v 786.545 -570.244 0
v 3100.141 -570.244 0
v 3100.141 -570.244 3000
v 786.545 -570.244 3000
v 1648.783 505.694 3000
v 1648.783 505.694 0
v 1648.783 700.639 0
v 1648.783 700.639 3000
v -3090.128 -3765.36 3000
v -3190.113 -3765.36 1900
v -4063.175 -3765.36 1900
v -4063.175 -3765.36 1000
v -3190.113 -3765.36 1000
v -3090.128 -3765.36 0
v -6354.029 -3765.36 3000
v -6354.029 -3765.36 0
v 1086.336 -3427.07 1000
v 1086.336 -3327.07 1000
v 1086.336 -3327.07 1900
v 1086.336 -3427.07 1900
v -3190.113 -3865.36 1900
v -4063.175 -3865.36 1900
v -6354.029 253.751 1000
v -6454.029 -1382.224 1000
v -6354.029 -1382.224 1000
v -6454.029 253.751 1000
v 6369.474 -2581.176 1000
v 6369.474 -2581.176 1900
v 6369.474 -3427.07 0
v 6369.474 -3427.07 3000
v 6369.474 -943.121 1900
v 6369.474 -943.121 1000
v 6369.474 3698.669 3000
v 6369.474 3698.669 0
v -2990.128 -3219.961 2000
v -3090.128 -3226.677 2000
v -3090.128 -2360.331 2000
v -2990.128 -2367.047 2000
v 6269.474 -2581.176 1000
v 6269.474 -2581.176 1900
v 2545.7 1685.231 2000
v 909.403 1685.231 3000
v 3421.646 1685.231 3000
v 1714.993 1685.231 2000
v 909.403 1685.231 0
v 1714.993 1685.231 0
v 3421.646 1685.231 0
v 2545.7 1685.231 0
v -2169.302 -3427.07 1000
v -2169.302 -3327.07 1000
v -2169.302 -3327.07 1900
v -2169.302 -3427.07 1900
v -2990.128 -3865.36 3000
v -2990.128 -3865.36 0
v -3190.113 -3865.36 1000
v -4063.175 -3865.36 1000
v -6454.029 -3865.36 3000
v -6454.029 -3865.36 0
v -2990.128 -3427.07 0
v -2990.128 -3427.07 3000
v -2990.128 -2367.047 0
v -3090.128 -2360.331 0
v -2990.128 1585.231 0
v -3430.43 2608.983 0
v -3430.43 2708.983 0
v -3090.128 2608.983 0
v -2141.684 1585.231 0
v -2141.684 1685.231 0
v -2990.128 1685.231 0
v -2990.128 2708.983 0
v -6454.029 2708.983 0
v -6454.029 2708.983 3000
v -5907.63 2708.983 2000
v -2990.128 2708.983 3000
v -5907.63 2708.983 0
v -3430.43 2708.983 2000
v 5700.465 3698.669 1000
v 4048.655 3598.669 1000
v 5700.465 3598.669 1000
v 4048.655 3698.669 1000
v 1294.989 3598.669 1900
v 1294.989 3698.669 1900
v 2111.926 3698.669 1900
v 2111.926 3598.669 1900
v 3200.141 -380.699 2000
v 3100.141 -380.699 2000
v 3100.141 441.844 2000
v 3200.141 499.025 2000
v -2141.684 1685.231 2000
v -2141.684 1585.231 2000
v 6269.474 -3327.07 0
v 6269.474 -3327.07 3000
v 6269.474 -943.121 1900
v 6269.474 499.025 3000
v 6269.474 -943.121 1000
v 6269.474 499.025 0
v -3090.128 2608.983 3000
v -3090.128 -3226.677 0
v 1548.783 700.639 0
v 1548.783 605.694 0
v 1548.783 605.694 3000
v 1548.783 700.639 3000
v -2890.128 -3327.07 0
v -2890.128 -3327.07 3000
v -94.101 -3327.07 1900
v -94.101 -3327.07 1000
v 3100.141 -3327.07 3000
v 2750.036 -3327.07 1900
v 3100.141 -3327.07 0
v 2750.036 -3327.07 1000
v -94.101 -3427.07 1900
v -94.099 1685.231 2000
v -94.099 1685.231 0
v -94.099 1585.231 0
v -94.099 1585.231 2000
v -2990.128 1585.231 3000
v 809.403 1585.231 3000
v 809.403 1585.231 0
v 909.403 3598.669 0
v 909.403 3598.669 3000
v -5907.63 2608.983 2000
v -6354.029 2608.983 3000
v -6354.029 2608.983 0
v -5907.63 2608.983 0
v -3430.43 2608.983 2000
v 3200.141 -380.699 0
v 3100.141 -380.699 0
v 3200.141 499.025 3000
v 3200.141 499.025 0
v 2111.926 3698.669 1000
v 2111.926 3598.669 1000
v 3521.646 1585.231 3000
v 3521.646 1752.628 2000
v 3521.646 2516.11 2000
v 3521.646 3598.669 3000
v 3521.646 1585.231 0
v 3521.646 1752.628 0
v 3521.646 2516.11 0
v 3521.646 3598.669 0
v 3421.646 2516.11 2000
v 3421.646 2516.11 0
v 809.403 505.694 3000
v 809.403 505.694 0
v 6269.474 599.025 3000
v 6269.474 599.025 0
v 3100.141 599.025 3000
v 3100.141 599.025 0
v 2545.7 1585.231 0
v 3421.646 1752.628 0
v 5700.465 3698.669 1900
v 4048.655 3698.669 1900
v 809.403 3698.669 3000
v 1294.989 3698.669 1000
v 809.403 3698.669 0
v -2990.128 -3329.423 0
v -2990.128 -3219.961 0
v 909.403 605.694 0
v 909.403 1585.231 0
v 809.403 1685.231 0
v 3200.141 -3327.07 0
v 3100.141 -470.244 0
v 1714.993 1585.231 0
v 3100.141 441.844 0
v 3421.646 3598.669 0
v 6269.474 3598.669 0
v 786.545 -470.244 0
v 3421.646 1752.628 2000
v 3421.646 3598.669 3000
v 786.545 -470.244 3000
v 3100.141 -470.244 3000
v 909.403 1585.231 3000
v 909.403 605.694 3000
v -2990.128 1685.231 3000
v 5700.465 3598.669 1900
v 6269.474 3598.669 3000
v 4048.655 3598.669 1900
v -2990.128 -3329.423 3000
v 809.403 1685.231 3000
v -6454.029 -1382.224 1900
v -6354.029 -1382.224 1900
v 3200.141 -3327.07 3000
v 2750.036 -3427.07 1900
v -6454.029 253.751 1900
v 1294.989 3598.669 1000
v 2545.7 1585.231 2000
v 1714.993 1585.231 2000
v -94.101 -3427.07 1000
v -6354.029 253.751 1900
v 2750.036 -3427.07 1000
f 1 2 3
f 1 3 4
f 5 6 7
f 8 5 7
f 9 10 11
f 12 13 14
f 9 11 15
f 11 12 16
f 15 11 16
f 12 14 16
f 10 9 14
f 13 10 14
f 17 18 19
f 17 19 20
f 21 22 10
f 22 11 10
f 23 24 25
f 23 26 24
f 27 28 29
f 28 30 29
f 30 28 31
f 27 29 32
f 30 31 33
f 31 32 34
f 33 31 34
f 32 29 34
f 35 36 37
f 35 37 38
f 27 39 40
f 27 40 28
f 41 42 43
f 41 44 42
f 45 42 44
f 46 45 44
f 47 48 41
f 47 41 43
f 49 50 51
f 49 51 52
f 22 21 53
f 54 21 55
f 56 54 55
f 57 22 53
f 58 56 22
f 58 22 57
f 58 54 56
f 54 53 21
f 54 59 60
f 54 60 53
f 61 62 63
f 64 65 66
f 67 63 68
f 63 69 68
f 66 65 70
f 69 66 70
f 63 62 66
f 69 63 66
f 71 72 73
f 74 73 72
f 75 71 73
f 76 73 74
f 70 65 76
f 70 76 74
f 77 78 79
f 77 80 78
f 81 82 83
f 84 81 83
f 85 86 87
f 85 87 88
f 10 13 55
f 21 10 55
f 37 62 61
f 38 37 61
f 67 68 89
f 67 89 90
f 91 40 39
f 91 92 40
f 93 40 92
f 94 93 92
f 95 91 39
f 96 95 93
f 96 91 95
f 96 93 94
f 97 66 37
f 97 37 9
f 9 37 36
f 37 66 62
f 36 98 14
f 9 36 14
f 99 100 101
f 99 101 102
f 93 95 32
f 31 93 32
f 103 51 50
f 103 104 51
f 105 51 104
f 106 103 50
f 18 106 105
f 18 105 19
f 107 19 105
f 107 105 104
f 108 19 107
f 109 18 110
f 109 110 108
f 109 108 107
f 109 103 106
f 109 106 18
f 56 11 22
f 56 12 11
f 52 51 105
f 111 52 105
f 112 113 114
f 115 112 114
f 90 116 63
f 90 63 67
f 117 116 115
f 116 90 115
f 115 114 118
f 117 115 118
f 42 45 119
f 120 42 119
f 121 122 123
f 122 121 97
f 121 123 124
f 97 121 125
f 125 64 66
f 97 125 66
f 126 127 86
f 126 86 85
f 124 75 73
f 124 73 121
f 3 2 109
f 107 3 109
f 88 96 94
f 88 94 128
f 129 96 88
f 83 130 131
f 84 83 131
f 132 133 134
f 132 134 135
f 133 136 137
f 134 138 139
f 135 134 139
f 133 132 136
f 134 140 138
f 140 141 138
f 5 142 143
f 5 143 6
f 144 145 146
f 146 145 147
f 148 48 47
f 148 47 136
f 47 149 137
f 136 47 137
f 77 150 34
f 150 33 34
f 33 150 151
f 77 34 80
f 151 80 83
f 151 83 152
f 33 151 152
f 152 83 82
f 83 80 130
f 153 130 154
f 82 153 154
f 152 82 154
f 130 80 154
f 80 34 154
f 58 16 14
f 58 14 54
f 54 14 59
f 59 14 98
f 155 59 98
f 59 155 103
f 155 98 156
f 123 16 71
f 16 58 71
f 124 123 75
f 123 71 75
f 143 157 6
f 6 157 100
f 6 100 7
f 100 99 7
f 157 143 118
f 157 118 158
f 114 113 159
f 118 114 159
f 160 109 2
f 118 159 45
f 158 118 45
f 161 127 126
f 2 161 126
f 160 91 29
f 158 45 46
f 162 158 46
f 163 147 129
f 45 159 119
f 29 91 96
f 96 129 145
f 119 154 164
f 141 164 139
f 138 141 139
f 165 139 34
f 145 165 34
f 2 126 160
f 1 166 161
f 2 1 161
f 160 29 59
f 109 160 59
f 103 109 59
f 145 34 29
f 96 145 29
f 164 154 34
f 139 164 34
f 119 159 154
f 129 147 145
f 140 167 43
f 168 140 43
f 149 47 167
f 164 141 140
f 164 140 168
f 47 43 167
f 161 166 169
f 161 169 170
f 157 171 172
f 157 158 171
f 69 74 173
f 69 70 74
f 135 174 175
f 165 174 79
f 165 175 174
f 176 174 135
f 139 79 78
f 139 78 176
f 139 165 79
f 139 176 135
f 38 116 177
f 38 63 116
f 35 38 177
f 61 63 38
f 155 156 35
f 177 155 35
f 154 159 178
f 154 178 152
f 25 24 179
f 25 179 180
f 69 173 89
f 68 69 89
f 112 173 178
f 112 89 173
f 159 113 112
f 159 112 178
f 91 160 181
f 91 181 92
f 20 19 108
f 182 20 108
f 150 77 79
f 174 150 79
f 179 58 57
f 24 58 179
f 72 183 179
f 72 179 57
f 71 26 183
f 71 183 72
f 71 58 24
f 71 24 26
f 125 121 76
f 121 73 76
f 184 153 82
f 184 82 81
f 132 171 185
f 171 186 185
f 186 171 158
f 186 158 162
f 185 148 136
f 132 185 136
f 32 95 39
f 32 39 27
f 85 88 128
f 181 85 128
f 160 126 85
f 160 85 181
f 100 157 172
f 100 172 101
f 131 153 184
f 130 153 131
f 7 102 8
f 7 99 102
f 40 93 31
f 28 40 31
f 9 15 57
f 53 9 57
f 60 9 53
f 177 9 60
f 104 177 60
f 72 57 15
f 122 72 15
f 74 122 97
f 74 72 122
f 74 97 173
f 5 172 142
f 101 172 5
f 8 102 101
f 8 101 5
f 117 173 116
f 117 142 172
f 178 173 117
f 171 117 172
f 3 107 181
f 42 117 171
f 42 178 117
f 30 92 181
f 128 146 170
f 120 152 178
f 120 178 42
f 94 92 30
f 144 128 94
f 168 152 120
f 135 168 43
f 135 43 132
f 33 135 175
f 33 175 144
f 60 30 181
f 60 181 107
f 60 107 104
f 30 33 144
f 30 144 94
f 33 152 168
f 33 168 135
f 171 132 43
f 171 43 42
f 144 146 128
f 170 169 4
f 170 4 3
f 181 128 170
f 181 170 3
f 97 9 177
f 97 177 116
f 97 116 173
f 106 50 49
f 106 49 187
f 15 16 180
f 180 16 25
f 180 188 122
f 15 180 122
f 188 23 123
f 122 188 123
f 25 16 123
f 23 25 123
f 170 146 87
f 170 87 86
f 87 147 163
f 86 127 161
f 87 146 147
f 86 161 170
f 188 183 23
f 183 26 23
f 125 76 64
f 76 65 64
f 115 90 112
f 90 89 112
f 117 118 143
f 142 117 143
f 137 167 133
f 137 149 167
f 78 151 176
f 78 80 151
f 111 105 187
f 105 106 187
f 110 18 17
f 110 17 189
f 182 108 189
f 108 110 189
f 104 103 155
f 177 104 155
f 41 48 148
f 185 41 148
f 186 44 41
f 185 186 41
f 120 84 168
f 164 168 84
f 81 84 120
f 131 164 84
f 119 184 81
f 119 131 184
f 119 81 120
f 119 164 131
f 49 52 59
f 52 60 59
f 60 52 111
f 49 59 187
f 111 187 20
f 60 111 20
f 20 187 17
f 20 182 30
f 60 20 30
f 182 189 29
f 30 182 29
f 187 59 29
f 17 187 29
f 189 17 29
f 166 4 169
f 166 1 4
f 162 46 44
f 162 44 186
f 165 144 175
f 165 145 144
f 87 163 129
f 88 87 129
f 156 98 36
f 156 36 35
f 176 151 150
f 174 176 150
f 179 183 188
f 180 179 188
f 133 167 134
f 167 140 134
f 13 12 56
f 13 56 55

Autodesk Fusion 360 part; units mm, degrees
sketch "Sketch1" plane through (0, 0, 0) normal (0, 0, 1) x (1, 0, 0)
  line L0 (-2990.1281, -3865.3597) -> (-6454.0292, -3865.3597)
  line L1 (-6454.0292, -3865.3597) -> (-6454.0292, 2708.9832)
  line L2 (-6454.0292, 2708.9832) -> (-2990.1281, 2708.9832)
  line L3 (-2990.1281, 2708.9832) -> (-2990.1281, -3865.3597)
  line L4 (-2990.1281, -3427.0701) -> (6369.4739, -3427.0701)
  line L5 (6369.4739, -3427.0701) -> (6369.4739, 3698.6692)
  line L6 (6369.4739, 3698.6692) -> (809.4029, 3698.6692)
  line L7 (-2990.1281, 2708.9832) -> (-2990.1281, -3427.0701)
  line L8 (-2990.1281, 1685.2306) -> (809.4029, 1685.2306)
  line L9 (809.4029, 1685.2306) -> (809.4029, 3698.6692)
  line L10 (-2990.1281, 2708.9832) -> (-2990.1281, 1685.2306)
  line L11 (6369.4739, 599.0251) -> (3100.141, 599.0251)
  line L12 (3100.141, 599.0251) -> (3100.141, -3427.0701)
  line L13 (3100.141, -3427.0701) -> (6369.4739, -3427.0701)
  line L14 (6369.4739, -3427.0701) -> (6369.4739, 599.0251)
  line L15 (3100.141, -570.2441) -> (786.5447, -570.2441)
  line L16 (786.5447, -570.2441) -> (786.5447, -470.2441)
  line L17 (786.5447, -470.2441) -> (3100.141, -470.2441)
  line L18 (3100.141, -470.2441) -> (3100.141, -570.2441)
  line L19 (-3090.1281, -3765.3597) -> (-6354.0292, -3765.3597)
  line L20 (-6354.0292, -3765.3597) -> (-6354.0292, 2608.9832)
  line L21 (-6354.0292, 2608.9832) -> (-3090.1281, 2608.9832)
  line L22 (-3090.1281, 2608.9832) -> (-3090.1281, -3765.3597)
  line L23 (-2890.1281, -3327.0701) -> (6269.4739, -3327.0701)
  line L24 (6269.4739, -3327.0701) -> (6269.4739, 3598.6692)
  line L25 (6269.4739, 3598.6692) -> (909.4029, 3598.6692)
  line L26 (909.4029, 1585.2306) -> (909.4029, 3598.6692)
  line L27 (-2890.1281, 1585.2306) -> (909.4029, 1585.2306)
  line L28 (-2890.1281, -3327.0701) -> (-2990.1281, -3329.4228)
  line L29 (-2890.1281, 1585.2306) -> (-2990.1281, 1585.2306)
  line L30 (6369.4739, 499.0251) -> (3200.141, 499.0251)
  line L31 (3200.141, 499.0251) -> (3200.141, -3427.0701)
  line L32 (809.4029, 1585.2306) -> (3521.6455, 1585.2306)
  line L33 (3521.6455, 1585.2306) -> (3521.6455, 3698.6692)
  line L34 (3521.6455, 3698.6692) -> (809.4029, 3698.6692)
  line L35 (809.4029, 3698.6692) -> (809.4029, 1585.2306)
  line L36 (809.4029, 1685.2306) -> (3421.6455, 1685.2306)
  line L37 (3421.6455, 1685.2306) -> (3421.6455, 3698.6692)
  line L38 (809.4029, 1585.2306) -> (809.4029, 505.694)
  line L39 (809.4029, 505.694) -> (1648.7831, 505.694)
  line L40 (1648.7831, 505.694) -> (1648.7831, 700.6388)
  line L41 (909.4029, 1585.2306) -> (909.4029, 605.694)
  line L42 (909.4029, 605.694) -> (1548.7831, 605.694)
  line L43 (1548.7831, 605.694) -> (1548.7831, 700.6388)
  line L44 (1548.7831, 700.6388) -> (1648.7831, 700.6388)
  line L45 (1294.9886, 3698.6692) -> (1294.9886, 3598.6692)
  line L46 (2111.9261, 3698.6692) -> (2111.9261, 3598.6692)
  line L47 (4048.6551, 3698.6692) -> (4048.6551, 3598.6692)
  line L48 (5700.4654, 3698.6692) -> (5700.4654, 3598.6692)
  line L49 (3421.6455, 2516.11) -> (3521.6455, 2516.11)
  line L50 (3421.6455, 1752.6279) -> (3521.6455, 1752.6279)
  line L51 (2545.6999, 1685.2306) -> (2545.6999, 1585.2306)
  line L52 (1714.993, 1685.2306) -> (1714.993, 1585.2306)
  line L53 (3100.141, 441.8435) -> (3200.141, 499.0251)
  line L54 (3100.141, -380.6989) -> (3200.141, -380.6989)
  line L55 (6269.4739, -943.1211) -> (6369.4739, -943.1211)
  line L56 (6269.4739, -2581.1757) -> (6369.4739, -2581.1757)
  line L57 (-2141.6835, 1685.2306) -> (-2141.6835, 1585.2306)
  line L58 (-94.0993, 1685.2306) -> (-94.0993, 1585.2306)
  line L59 (-5907.6305, 2708.9832) -> (-5907.6305, 2608.9832)
  line L60 (-3430.4296, 2708.9832) -> (-3430.4296, 2608.9832)
  line L61 (-6454.0292, 253.7511) -> (-6354.0292, 253.7511)
  line L62 (-6454.0292, -1382.2244) -> (-6354.0292, -1382.2244)
  line L63 (-4063.1748, -3765.3597) -> (-4063.1748, -3865.3597)
  line L64 (-3190.1129, -3765.3597) -> (-3190.1129, -3865.3597)
  line L65 (-3090.1281, -3226.6773) -> (-2990.1281, -3219.9614)
  line L66 (-3090.1281, -2360.3312) -> (-2990.1281, -2367.047)
  line L67 (-2169.3019, -3327.0701) -> (-2169.3019, -3427.0701)
  line L68 (-94.1008, -3327.0701) -> (-94.1008, -3427.0701)
  line L69 (1086.3361, -3327.0701) -> (1086.3361, -3427.0701)
  line L70 (2750.0365, -3327.0701) -> (2750.0365, -3427.0701)
  dimension "d1" = 100
  dimension "d3" = 100
  dimension "d4" = -100
  dimension "d5" = -100
  dimension "d6" = -100
extrude "Extrude1" add sketch "Sketch1" along normal blind 3000 contours L0 L3 L7 L19 L22 L64 L65 | L0 L19 L63 L64 | L3 L4 L7 L23 L28 L67 | L0 L1 L19 L20 L62 L63 | L4 L23 L67 L68 | L4 L23 L68 L69 | L1 L20 L61 L62 | L2 L3 L7 L10 L21 L22 L60 L66 | L4 L23 L69 L70 | L1 L2 L20 L21 L59 L61 | L3 L7 L8 L27 L29 L57 | L4 L12 L23 L70 | L4 L12 L13 L23 L31 | L4 L5 L13 L14 L23 L24 L31 L56 | L12 L18 L23 L31 L54 | L8 L27 L35 L58 | L12 L15 L16 L17 L18 | L26 L27 L32 L35 L36 | L6 L9 L25 L26 L34 L35 L36 L45 | L27 L32 L38 L39 L40 L41 L42 L43 L44 | L5 L14 L24 L55 L56 | L26 L32 L36 L52 | L5 L14 L24 L30 L55 | L11 L12 L24 L30 L53 | L6 L25 L34 L45 L46 | L5 L11 L14 L24 L30 | L6 L25 L34 L37 L46 | L32 L33 L36 L37 L50 L51 | L5 L6 L11 L24 L25 L48 | L6 L25 L33 L34 L37 | L6 L25 L33 L47 | L25 L33 L37 L49 | L6 L25 L47 L48 makes body 1 at (129.7392, -3427.0701, 1000) makes body 2 at (2871.0151, 1585.2306, 1000) makes body 3 at (-3090.1281, 952.545, 1000)
extrude "Extrude2" cut sketch "Sketch1" along normal blind 900 from surface at 1000 contours L0 L19 L63 L64 | L4 L23 L67 L68 | L1 L20 L61 L62 | L4 L23 L69 L70 | L5 L14 L24 L55 L56 | L6 L25 L34 L45 L46 | L6 L25 L47 L48 bodies 1
extrude "Extrude3" add sketch "Sketch1" along normal blind 1000 from surface at 2000 contours L3 L7 L22 L65 L66 | L2 L21 L59 L60 | L8 L27 L57 L58 | L12 L31 L53 L54 | L32 L36 L51 L52 | L33 L37 L49 L50 bodies 1 2 3
sketch "Sketch2" plane through (0, 0, 3000) normal (0, 0, 1) x (-1, 0, 0)
  line L0 (7020.2567, -3282.1442) -> (-157.9932, -3282.1442)
  line L1 (-157.9932, -3282.1442) -> (-157.9932, -4307.6085)
  line L2 (-157.9932, -4307.6085) -> (-6983.7398, -4307.6085)
  line L3 (-6983.7398, -4307.6085) -> (-6983.7398, 4040.3116)
  line L4 (-6983.7398, 4040.3116) -> (7004.2338, 4040.3116)
  line L5 (7004.2338, 4040.3116) -> (7020.2567, -3282.1442)
sketch "Sketch3" plane through (0, 0, 0) normal (0, 1, 0) x (1, 0, 0)
  line L0 (6983.7398, -3000) -> (4583.9009, -4982.1418)
  line L1 (4583.9009, -4982.1418) -> (-5175.4891, -4982.1418)
  line L2 (-5175.4891, -4982.1418) -> (-7004.2338, -3000)
  line L3 (-7004.2338, -3000) -> (6983.7398, -3000)
